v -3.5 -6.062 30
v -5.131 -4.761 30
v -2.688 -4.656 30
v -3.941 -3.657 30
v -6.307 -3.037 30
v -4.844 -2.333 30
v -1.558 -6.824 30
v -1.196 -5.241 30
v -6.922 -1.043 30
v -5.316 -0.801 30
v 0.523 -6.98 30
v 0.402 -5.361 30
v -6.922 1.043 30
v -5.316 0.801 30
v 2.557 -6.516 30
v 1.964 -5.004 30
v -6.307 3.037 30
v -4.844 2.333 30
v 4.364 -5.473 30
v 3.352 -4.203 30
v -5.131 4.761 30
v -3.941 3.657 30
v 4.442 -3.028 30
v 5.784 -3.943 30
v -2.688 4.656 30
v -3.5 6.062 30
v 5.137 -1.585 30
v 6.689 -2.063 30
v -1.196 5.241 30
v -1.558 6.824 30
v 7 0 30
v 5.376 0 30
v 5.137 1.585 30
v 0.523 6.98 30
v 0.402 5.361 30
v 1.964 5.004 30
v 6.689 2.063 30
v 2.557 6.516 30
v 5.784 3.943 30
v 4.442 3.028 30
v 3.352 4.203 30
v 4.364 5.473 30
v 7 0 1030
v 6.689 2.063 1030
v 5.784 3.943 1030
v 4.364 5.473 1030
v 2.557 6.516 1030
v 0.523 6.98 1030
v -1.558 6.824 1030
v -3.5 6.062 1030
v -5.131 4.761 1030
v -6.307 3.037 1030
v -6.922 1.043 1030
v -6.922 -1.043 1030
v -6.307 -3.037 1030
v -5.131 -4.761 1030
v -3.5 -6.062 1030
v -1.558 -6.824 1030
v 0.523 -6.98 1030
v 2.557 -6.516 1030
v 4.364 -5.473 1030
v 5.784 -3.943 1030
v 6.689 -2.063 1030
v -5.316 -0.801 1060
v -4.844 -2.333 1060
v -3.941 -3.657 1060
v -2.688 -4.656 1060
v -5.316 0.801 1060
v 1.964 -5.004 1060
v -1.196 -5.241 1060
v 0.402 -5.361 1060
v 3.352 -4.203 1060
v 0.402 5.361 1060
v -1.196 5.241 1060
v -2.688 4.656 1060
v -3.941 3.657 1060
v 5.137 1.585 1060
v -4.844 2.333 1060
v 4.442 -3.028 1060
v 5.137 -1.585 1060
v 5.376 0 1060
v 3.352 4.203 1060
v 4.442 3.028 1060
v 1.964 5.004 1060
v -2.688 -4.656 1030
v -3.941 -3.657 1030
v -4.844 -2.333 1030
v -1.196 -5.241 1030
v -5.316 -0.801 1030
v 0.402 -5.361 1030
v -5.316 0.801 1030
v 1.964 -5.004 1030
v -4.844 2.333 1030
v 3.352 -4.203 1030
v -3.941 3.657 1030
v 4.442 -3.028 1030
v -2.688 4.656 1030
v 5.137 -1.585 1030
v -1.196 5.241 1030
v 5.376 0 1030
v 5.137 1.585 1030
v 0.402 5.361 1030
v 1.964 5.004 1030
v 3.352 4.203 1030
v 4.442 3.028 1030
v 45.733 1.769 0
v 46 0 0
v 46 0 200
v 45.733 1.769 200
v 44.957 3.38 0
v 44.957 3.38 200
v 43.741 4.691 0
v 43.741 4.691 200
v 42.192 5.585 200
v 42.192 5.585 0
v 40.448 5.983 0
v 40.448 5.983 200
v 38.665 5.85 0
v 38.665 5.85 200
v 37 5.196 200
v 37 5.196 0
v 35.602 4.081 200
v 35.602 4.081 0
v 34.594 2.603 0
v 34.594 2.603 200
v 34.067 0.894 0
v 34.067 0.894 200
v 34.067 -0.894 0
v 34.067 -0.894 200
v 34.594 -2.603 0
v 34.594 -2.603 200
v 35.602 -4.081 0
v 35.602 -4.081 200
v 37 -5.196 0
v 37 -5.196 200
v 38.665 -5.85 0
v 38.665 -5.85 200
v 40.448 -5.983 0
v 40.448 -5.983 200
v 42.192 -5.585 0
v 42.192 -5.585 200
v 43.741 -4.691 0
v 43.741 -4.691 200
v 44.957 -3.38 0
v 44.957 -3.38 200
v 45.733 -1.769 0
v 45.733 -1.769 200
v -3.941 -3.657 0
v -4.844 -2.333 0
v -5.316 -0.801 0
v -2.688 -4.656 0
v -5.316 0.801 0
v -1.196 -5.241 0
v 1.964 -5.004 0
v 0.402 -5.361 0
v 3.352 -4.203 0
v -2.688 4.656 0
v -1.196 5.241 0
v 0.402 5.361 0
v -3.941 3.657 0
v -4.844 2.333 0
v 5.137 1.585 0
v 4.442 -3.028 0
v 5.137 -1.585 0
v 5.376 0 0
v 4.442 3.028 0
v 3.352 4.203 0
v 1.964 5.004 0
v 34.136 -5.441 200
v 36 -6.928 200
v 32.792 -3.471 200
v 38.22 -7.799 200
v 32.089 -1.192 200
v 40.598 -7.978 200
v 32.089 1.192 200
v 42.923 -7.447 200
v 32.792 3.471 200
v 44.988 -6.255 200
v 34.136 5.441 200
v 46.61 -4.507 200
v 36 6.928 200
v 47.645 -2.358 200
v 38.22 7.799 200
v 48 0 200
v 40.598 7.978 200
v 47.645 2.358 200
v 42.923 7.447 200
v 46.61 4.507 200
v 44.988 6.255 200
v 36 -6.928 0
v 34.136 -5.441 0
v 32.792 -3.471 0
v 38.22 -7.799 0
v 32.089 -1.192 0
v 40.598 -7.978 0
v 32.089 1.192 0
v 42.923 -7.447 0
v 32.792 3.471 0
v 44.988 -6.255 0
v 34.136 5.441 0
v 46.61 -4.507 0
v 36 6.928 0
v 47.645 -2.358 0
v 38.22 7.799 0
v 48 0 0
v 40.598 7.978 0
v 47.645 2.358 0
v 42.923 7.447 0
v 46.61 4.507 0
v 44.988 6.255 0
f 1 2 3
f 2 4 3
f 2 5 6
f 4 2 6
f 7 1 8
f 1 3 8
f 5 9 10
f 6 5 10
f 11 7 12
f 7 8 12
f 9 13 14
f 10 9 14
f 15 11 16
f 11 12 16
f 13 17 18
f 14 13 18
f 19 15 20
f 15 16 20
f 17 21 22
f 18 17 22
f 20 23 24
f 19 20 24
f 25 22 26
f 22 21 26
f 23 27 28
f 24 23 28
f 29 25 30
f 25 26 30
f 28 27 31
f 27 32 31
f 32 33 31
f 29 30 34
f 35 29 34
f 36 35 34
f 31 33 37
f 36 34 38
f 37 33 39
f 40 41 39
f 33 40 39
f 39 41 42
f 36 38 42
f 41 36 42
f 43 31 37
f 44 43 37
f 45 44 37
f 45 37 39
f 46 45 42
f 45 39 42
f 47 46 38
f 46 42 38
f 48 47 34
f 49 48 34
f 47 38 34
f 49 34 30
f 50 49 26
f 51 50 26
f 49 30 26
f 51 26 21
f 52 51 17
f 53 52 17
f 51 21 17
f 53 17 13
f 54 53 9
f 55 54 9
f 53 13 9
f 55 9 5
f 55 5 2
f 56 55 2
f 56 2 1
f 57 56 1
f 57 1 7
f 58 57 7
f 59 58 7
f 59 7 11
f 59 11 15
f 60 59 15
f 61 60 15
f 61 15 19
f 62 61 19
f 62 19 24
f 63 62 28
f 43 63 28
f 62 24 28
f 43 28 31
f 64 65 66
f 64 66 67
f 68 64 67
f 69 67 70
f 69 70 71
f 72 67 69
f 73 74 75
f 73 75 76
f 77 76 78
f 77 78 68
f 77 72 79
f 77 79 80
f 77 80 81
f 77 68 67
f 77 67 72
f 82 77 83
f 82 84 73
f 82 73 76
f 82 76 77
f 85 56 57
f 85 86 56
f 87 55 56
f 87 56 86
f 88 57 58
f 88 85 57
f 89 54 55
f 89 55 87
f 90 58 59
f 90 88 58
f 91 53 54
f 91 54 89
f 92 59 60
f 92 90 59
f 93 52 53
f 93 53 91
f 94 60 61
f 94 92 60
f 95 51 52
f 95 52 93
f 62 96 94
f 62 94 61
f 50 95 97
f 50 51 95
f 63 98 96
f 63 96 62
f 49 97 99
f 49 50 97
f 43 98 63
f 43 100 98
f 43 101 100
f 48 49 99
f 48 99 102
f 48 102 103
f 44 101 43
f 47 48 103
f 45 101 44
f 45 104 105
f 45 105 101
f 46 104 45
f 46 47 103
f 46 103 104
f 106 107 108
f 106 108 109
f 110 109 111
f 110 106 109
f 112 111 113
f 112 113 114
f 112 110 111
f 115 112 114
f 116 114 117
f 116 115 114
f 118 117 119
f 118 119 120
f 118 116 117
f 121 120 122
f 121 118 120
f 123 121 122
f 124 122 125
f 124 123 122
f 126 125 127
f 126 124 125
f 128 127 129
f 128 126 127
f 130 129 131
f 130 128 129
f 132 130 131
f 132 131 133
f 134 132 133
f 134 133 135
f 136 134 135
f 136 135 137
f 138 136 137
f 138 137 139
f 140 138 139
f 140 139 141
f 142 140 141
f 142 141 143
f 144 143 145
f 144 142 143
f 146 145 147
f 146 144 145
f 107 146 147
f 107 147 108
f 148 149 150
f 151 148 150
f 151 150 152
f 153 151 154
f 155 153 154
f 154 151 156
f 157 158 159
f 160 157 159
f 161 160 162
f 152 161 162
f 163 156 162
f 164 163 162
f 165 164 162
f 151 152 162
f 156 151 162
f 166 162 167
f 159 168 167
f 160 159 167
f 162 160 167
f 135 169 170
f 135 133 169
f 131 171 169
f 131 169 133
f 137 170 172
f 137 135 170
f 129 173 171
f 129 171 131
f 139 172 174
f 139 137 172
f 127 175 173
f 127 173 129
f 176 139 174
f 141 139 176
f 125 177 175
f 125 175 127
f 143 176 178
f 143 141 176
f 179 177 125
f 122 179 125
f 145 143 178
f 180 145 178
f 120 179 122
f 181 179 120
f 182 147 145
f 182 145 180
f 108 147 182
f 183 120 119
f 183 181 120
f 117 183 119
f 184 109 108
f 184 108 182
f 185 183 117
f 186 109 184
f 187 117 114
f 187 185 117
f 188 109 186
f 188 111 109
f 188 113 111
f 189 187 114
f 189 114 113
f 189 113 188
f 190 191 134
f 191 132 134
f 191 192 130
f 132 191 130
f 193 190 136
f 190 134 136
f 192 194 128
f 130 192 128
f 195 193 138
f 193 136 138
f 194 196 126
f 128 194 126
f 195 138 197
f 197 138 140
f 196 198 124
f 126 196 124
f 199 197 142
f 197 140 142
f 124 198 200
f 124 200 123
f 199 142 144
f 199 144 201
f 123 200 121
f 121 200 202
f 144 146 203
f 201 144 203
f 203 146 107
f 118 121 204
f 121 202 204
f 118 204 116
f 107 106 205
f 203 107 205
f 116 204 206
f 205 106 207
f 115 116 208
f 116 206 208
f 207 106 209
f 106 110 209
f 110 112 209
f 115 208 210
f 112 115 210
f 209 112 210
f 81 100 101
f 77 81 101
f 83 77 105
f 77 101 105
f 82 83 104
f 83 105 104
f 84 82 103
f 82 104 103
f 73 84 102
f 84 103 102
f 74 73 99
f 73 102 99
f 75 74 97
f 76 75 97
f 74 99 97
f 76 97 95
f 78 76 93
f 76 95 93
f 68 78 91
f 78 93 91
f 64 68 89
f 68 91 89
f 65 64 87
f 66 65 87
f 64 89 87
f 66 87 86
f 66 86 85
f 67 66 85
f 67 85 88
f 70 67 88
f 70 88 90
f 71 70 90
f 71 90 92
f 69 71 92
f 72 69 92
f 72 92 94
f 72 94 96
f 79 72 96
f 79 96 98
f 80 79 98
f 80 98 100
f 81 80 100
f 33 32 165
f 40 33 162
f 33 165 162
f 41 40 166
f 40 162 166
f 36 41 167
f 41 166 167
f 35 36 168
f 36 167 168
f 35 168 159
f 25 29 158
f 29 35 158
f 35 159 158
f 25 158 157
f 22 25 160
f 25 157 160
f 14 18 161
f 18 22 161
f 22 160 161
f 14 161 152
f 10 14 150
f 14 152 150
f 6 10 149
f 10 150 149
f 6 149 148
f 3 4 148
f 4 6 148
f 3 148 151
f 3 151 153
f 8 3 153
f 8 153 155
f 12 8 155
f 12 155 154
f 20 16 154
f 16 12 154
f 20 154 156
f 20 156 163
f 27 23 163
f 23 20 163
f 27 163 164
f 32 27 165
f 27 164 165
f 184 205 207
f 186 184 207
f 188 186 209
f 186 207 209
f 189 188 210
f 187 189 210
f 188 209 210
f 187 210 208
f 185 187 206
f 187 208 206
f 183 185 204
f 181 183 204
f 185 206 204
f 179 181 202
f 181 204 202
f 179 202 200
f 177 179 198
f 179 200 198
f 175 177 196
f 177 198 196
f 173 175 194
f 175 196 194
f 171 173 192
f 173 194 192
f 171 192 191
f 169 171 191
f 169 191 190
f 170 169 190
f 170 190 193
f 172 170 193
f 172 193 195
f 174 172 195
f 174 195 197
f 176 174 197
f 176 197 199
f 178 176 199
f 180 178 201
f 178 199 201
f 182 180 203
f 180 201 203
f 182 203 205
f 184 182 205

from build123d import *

# Parameters (mm, degrees)
F3_R     = 5.376
F4_DEPTH = 1060
F6_R     = 7
F7_DEPTH = 1000
F3_R_2   = 8
F3_R_3   = 6
F8_DEPTH = 200


with BuildPart() as f4:
    # F3 (on Top) → F4 (new body)
    with BuildSketch(Plane.XY):
        Circle(F3_R)
    extrude(amount=F4_DEPTH)

    # F6 (on offset) → F7 (join)
    with BuildSketch(Plane.XY.offset(30)):
        Circle(F6_R)
    extrude(amount=F7_DEPTH)


with BuildPart() as f8:
    # F3 (on Top) → F8 (new body)
    with BuildSketch(Plane.XY):
        with Locations((40, 0)):
            Circle(F3_R_2)
        with Locations((40, 0)):
            Circle(F3_R_3, mode=Mode.SUBTRACT)
    extrude(amount=F8_DEPTH)


solid = Compound([f4.part, f8.part])
